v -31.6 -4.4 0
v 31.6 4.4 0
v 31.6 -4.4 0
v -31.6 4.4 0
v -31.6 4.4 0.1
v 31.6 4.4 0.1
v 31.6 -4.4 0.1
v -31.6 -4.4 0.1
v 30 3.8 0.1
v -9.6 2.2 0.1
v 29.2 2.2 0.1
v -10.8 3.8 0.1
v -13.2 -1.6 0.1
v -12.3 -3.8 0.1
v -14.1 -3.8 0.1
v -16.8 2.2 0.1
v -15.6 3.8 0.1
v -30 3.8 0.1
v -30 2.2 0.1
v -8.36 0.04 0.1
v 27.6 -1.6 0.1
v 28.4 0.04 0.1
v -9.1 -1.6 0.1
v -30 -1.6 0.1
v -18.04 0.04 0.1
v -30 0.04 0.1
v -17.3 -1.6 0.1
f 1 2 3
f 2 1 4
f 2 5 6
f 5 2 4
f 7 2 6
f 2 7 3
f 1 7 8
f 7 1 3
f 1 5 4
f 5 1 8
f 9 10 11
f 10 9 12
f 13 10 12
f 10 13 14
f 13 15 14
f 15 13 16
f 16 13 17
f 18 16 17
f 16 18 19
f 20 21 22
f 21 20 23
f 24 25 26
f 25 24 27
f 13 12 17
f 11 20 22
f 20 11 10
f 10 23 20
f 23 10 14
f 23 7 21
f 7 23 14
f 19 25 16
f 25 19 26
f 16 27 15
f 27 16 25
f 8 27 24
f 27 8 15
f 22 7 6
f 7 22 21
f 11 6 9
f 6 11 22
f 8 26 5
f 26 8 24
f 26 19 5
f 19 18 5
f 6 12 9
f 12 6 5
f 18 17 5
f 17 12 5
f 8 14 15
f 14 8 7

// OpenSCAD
// file: ../p/box5-12.scad
use <../lib.scad>
function ldraw_lib__box5_12() = [
// 0 Box with 5 Faces without Any Edges
// 0 Name: box5-12.dat
// 0 Author: Chris Dee [cwdee]
// 0 !LDRAW_ORG Primitive UPDATE 2009-02
// 0 !LICENSE Licensed under CC BY 4.0 : see CAreadme.txt
// 
// 0 BFC CERTIFY CCW
  [0,"BFC","CERTIFY"],
  [0,"BFC","CCW"],
// 
// 0 !HISTORY 2009-09-03 [PTadmin] Official Update 2009-02
// 
// 
// 4 16 1 1 1 1 1 -1 -1 1 -1 -1 1 1
  [4,16,1,1,1,1,1,-1,-1,1,-1,-1,1,1],
// 4 16 -1 0 1 1 0 1 1 1 1 -1 1 1
  [4,16,-1,0,1,1,0,1,1,1,1,-1,1,1],
// 4 16 -1 0 -1 -1 0 1 -1 1 1 -1 1 -1
  [4,16,-1,0,-1,-1,0,1,-1,1,1,-1,1,-1],
// 4 16 1 0 -1 -1 0 -1 -1 1 -1 1 1 -1
  [4,16,1,0,-1,-1,0,-1,-1,1,-1,1,1,-1],
// 4 16 1 0 1 1 0 -1 1 1 -1 1 1 1
  [4,16,1,0,1,1,0,-1,1,1,-1,1,1,1],
// 0
];
module ldraw_lib__box5_12(step=0, col=false, unit=2/5, alt=false, line=0.2, solid=!$preview)
    makepoly(ldraw_lib__box5_12(), step=step, col=col, unit=unit, alt=alt, line=line, solid=solid);
ldraw_lib__box5_12(line=0.2);
// file: 165485c.scad
use <../lib.scad>
use <../p/box5-12.scad>
function ldraw_lib__165485c() = [
// 0 Sticker  1.1 x  7.9 with Blue V and Red Lines Left on Transparent Background
// 0 Name: 165485c.dat
// 0 Author: Takeshi Takahashi [RainbowDolphin]
// 0 !LDRAW_ORG Part UPDATE 2022-06
// 0 !LICENSE Licensed under CC BY 4.0 : see CAreadme.txt
// 
// 0 BFC CERTIFY CCW
  [0,"BFC","CERTIFY"],
  [0,"BFC","CCW"],
// 
// 0 !KEYWORDS Bricklink 6346stk01, Brickowl 418865, Orbiter, Rebrickable 165485
// 0 !KEYWORDS set 6346, Space Shuttle
// 
// 0 !HISTORY 2022-06-18 [RainbowDolphin] Created based on 165485a by David Manley [djm]
// 0 !HISTORY 2022-12-20 [PTadmin] Official Update 2022-06
// 
// 
// 1 16 0 -0.25 0 79 0 0 0 0.25 0 0 0 11 box5-12.dat
  [1,16,0,-0.25,0,79,0,0,0,0.25,0,0,0,11, ldraw_lib__box5_12()],
// 0 BFC NOCLIP
  [0,"BFC","NOCLIP"],
// 4 1 -73 -0.25 5.5 24 -0.25 5.5 27 -0.25 9.5 -75 -0.25 9.5
  [4,1,-73,-0.25,5.5,24,-0.25,5.5,27,-0.25,9.5,-75,-0.25,9.5],
// 4 1 30.75 -0.25 -9.5 33 -0.25 -4 27 -0.25 9.5 24 -0.25 5.5
  [4,1,30.75,-0.25,-9.5,33,-0.25,-4,27,-0.25,9.5,24,-0.25,5.5],
// 4 1 33 -0.25 -4 30.75 -0.25 -9.5 35.25 -0.25 -9.5 42 -0.25 5.5
  [4,1,33,-0.25,-4,30.75,-0.25,-9.5,35.25,-0.25,-9.5,42,-0.25,5.5],
// 3 1 39 -0.25 9.5 33 -0.25 -4 42 -0.25 5.5
  [3,1,39,-0.25,9.5,33,-0.25,-4,42,-0.25,5.5],
// 4 1 75 -0.25 9.5 39 -0.25 9.5 42 -0.25 5.5 75 -0.25 5.5
  [4,1,75,-0.25,9.5,39,-0.25,9.5,42,-0.25,5.5,75,-0.25,5.5],
// 4 4 -69 -0.25 -4 22.75 -0.25 -4 20.9 -0.25 0.1 -71 -0.25 0.1
  [4,4,-69,-0.25,-4,22.75,-0.25,-4,20.9,-0.25,0.1,-71,-0.25,0.1],
// 4 4 75 -0.25 0.1 45.1 -0.25 0.1 43.25 -0.25 -4 75 -0.25 -4
  [4,4,75,-0.25,0.1,45.1,-0.25,0.1,43.25,-0.25,-4,75,-0.25,-4],
// 0 BFC CLIP
  [0,"BFC","CLIP"],
// 3 16 39 -0.25 9.5 27 -0.25 9.5 33 -0.25 -4
  [3,16,39,-0.25,9.5,27,-0.25,9.5,33,-0.25,-4],
// 4 16 -71 -0.25 0.1 20.9 -0.25 0.1 24 -0.25 5.5 -73 -0.25 5.5
  [4,16,-71,-0.25,0.1,20.9,-0.25,0.1,24,-0.25,5.5,-73,-0.25,5.5],
// 4 16 24 -0.25 5.5 20.9 -0.25 0.1 22.75 -0.25 -4 30.75 -0.25 -9.5
  [4,16,24,-0.25,5.5,20.9,-0.25,0.1,22.75,-0.25,-4,30.75,-0.25,-9.5],
// 4 16 30.75 -0.25 -9.5 22.75 -0.25 -4 -69 -0.25 -4 -79 -0.25 -11
  [4,16,30.75,-0.25,-9.5,22.75,-0.25,-4,-69,-0.25,-4,-79,-0.25,-11],
// 4 16 75 -0.25 5.5 42 -0.25 5.5 45.1 -0.25 0.1 75 -0.25 0.1
  [4,16,75,-0.25,5.5,42,-0.25,5.5,45.1,-0.25,0.1,75,-0.25,0.1],
// 4 16 35.25 -0.25 -9.5 43.25 -0.25 -4 45.1 -0.25 0.1 42 -0.25 5.5
  [4,16,35.25,-0.25,-9.5,43.25,-0.25,-4,45.1,-0.25,0.1,42,-0.25,5.5],
// 4 16 75 -0.25 -4 43.25 -0.25 -4 35.25 -0.25 -9.5 79 -0.25 -11
  [4,16,75,-0.25,-4,43.25,-0.25,-4,35.25,-0.25,-9.5,79,-0.25,-11],
// 4 16 -79 -0.25 -11 -69 -0.25 -4 -71 -0.25 0.1 -79 -0.25 11
  [4,16,-79,-0.25,-11,-69,-0.25,-4,-71,-0.25,0.1,-79,-0.25,11],
// 4 16 -79 -0.25 11 -71 -0.25 0.1 -73 -0.25 5.5 -75 -0.25 9.5
  [4,16,-79,-0.25,11,-71,-0.25,0.1,-73,-0.25,5.5,-75,-0.25,9.5],
// 4 16 79 -0.25 11 75 -0.25 0.1 75 -0.25 -4 79 -0.25 -11
  [4,16,79,-0.25,11,75,-0.25,0.1,75,-0.25,-4,79,-0.25,-11],
// 3 16 79 -0.25 11 75 -0.25 5.5 75 -0.25 0.1
  [3,16,79,-0.25,11,75,-0.25,5.5,75,-0.25,0.1],
// 3 16 79 -0.25 11 75 -0.25 9.5 75 -0.25 5.5
  [3,16,79,-0.25,11,75,-0.25,9.5,75,-0.25,5.5],
// 4 16 -79 -0.25 11 -75 -0.25 9.5 27 -0.25 9.5 79 -0.25 11
  [4,16,-79,-0.25,11,-75,-0.25,9.5,27,-0.25,9.5,79,-0.25,11],
// 3 16 79 -0.25 11 39 -0.25 9.5 75 -0.25 9.5
  [3,16,79,-0.25,11,39,-0.25,9.5,75,-0.25,9.5],
// 3 16 79 -0.25 11 27 -0.25 9.5 39 -0.25 9.5
  [3,16,79,-0.25,11,27,-0.25,9.5,39,-0.25,9.5],
// 4 16 -79 -0.25 -11 79 -0.25 -11 35.25 -0.25 -9.5 30.75 -0.25 -9.5
  [4,16,-79,-0.25,-11,79,-0.25,-11,35.25,-0.25,-9.5,30.75,-0.25,-9.5],
];
module ldraw_lib__165485c(step=0, col=false, unit=2/5, alt=false, line=0.2, solid=!$preview)
    makepoly(ldraw_lib__165485c(), step=step, col=col, unit=unit, alt=alt, line=line, solid=solid);
ldraw_lib__165485c(line=0.2);
// main file
use <../lib.scad>
use <165485c.scad>
function ldraw_lib__165485b() = [
// 0 Sticker  1.1 x  7.9 with Blue V and Red Lines Right on Transparent Background
// 0 Name: 165485b.dat
// 0 Author: Takeshi Takahashi [RainbowDolphin]
// 0 !LDRAW_ORG Part UPDATE 2022-06
// 0 !LICENSE Licensed under CC BY 4.0 : see CAreadme.txt
// 
// 0 BFC CERTIFY CCW
  [0,"BFC","CERTIFY"],
  [0,"BFC","CCW"],
// 
// 0 !KEYWORDS Bricklink 6346stk01, Brickowl 418865, Orbiter, Rebrickable 165485
// 0 !KEYWORDS set 6346, Space Shuttle
// 
// 0 !HISTORY 2022-06-18 [RainbowDolphin] Created based on 165485a by David Manley [djm]
// 0 !HISTORY 2022-12-20 [PTadmin] Official Update 2022-06
// 
// 
// 1 16 0 0 0 -1 0 0 0 1 0 0 0 1 165485c.dat
  [1,16,0,0,0,-1,0,0,0,1,0,0,0,1, ldraw_lib__165485c()],
];
module ldraw_lib__165485b(step=0, col=false, unit=2/5, alt=false, line=0.2, solid=!$preview)
    makepoly(ldraw_lib__165485b(), step=step, col=col, unit=unit, alt=alt, line=line, solid=solid);
ldraw_lib__165485b(line=0.2);
